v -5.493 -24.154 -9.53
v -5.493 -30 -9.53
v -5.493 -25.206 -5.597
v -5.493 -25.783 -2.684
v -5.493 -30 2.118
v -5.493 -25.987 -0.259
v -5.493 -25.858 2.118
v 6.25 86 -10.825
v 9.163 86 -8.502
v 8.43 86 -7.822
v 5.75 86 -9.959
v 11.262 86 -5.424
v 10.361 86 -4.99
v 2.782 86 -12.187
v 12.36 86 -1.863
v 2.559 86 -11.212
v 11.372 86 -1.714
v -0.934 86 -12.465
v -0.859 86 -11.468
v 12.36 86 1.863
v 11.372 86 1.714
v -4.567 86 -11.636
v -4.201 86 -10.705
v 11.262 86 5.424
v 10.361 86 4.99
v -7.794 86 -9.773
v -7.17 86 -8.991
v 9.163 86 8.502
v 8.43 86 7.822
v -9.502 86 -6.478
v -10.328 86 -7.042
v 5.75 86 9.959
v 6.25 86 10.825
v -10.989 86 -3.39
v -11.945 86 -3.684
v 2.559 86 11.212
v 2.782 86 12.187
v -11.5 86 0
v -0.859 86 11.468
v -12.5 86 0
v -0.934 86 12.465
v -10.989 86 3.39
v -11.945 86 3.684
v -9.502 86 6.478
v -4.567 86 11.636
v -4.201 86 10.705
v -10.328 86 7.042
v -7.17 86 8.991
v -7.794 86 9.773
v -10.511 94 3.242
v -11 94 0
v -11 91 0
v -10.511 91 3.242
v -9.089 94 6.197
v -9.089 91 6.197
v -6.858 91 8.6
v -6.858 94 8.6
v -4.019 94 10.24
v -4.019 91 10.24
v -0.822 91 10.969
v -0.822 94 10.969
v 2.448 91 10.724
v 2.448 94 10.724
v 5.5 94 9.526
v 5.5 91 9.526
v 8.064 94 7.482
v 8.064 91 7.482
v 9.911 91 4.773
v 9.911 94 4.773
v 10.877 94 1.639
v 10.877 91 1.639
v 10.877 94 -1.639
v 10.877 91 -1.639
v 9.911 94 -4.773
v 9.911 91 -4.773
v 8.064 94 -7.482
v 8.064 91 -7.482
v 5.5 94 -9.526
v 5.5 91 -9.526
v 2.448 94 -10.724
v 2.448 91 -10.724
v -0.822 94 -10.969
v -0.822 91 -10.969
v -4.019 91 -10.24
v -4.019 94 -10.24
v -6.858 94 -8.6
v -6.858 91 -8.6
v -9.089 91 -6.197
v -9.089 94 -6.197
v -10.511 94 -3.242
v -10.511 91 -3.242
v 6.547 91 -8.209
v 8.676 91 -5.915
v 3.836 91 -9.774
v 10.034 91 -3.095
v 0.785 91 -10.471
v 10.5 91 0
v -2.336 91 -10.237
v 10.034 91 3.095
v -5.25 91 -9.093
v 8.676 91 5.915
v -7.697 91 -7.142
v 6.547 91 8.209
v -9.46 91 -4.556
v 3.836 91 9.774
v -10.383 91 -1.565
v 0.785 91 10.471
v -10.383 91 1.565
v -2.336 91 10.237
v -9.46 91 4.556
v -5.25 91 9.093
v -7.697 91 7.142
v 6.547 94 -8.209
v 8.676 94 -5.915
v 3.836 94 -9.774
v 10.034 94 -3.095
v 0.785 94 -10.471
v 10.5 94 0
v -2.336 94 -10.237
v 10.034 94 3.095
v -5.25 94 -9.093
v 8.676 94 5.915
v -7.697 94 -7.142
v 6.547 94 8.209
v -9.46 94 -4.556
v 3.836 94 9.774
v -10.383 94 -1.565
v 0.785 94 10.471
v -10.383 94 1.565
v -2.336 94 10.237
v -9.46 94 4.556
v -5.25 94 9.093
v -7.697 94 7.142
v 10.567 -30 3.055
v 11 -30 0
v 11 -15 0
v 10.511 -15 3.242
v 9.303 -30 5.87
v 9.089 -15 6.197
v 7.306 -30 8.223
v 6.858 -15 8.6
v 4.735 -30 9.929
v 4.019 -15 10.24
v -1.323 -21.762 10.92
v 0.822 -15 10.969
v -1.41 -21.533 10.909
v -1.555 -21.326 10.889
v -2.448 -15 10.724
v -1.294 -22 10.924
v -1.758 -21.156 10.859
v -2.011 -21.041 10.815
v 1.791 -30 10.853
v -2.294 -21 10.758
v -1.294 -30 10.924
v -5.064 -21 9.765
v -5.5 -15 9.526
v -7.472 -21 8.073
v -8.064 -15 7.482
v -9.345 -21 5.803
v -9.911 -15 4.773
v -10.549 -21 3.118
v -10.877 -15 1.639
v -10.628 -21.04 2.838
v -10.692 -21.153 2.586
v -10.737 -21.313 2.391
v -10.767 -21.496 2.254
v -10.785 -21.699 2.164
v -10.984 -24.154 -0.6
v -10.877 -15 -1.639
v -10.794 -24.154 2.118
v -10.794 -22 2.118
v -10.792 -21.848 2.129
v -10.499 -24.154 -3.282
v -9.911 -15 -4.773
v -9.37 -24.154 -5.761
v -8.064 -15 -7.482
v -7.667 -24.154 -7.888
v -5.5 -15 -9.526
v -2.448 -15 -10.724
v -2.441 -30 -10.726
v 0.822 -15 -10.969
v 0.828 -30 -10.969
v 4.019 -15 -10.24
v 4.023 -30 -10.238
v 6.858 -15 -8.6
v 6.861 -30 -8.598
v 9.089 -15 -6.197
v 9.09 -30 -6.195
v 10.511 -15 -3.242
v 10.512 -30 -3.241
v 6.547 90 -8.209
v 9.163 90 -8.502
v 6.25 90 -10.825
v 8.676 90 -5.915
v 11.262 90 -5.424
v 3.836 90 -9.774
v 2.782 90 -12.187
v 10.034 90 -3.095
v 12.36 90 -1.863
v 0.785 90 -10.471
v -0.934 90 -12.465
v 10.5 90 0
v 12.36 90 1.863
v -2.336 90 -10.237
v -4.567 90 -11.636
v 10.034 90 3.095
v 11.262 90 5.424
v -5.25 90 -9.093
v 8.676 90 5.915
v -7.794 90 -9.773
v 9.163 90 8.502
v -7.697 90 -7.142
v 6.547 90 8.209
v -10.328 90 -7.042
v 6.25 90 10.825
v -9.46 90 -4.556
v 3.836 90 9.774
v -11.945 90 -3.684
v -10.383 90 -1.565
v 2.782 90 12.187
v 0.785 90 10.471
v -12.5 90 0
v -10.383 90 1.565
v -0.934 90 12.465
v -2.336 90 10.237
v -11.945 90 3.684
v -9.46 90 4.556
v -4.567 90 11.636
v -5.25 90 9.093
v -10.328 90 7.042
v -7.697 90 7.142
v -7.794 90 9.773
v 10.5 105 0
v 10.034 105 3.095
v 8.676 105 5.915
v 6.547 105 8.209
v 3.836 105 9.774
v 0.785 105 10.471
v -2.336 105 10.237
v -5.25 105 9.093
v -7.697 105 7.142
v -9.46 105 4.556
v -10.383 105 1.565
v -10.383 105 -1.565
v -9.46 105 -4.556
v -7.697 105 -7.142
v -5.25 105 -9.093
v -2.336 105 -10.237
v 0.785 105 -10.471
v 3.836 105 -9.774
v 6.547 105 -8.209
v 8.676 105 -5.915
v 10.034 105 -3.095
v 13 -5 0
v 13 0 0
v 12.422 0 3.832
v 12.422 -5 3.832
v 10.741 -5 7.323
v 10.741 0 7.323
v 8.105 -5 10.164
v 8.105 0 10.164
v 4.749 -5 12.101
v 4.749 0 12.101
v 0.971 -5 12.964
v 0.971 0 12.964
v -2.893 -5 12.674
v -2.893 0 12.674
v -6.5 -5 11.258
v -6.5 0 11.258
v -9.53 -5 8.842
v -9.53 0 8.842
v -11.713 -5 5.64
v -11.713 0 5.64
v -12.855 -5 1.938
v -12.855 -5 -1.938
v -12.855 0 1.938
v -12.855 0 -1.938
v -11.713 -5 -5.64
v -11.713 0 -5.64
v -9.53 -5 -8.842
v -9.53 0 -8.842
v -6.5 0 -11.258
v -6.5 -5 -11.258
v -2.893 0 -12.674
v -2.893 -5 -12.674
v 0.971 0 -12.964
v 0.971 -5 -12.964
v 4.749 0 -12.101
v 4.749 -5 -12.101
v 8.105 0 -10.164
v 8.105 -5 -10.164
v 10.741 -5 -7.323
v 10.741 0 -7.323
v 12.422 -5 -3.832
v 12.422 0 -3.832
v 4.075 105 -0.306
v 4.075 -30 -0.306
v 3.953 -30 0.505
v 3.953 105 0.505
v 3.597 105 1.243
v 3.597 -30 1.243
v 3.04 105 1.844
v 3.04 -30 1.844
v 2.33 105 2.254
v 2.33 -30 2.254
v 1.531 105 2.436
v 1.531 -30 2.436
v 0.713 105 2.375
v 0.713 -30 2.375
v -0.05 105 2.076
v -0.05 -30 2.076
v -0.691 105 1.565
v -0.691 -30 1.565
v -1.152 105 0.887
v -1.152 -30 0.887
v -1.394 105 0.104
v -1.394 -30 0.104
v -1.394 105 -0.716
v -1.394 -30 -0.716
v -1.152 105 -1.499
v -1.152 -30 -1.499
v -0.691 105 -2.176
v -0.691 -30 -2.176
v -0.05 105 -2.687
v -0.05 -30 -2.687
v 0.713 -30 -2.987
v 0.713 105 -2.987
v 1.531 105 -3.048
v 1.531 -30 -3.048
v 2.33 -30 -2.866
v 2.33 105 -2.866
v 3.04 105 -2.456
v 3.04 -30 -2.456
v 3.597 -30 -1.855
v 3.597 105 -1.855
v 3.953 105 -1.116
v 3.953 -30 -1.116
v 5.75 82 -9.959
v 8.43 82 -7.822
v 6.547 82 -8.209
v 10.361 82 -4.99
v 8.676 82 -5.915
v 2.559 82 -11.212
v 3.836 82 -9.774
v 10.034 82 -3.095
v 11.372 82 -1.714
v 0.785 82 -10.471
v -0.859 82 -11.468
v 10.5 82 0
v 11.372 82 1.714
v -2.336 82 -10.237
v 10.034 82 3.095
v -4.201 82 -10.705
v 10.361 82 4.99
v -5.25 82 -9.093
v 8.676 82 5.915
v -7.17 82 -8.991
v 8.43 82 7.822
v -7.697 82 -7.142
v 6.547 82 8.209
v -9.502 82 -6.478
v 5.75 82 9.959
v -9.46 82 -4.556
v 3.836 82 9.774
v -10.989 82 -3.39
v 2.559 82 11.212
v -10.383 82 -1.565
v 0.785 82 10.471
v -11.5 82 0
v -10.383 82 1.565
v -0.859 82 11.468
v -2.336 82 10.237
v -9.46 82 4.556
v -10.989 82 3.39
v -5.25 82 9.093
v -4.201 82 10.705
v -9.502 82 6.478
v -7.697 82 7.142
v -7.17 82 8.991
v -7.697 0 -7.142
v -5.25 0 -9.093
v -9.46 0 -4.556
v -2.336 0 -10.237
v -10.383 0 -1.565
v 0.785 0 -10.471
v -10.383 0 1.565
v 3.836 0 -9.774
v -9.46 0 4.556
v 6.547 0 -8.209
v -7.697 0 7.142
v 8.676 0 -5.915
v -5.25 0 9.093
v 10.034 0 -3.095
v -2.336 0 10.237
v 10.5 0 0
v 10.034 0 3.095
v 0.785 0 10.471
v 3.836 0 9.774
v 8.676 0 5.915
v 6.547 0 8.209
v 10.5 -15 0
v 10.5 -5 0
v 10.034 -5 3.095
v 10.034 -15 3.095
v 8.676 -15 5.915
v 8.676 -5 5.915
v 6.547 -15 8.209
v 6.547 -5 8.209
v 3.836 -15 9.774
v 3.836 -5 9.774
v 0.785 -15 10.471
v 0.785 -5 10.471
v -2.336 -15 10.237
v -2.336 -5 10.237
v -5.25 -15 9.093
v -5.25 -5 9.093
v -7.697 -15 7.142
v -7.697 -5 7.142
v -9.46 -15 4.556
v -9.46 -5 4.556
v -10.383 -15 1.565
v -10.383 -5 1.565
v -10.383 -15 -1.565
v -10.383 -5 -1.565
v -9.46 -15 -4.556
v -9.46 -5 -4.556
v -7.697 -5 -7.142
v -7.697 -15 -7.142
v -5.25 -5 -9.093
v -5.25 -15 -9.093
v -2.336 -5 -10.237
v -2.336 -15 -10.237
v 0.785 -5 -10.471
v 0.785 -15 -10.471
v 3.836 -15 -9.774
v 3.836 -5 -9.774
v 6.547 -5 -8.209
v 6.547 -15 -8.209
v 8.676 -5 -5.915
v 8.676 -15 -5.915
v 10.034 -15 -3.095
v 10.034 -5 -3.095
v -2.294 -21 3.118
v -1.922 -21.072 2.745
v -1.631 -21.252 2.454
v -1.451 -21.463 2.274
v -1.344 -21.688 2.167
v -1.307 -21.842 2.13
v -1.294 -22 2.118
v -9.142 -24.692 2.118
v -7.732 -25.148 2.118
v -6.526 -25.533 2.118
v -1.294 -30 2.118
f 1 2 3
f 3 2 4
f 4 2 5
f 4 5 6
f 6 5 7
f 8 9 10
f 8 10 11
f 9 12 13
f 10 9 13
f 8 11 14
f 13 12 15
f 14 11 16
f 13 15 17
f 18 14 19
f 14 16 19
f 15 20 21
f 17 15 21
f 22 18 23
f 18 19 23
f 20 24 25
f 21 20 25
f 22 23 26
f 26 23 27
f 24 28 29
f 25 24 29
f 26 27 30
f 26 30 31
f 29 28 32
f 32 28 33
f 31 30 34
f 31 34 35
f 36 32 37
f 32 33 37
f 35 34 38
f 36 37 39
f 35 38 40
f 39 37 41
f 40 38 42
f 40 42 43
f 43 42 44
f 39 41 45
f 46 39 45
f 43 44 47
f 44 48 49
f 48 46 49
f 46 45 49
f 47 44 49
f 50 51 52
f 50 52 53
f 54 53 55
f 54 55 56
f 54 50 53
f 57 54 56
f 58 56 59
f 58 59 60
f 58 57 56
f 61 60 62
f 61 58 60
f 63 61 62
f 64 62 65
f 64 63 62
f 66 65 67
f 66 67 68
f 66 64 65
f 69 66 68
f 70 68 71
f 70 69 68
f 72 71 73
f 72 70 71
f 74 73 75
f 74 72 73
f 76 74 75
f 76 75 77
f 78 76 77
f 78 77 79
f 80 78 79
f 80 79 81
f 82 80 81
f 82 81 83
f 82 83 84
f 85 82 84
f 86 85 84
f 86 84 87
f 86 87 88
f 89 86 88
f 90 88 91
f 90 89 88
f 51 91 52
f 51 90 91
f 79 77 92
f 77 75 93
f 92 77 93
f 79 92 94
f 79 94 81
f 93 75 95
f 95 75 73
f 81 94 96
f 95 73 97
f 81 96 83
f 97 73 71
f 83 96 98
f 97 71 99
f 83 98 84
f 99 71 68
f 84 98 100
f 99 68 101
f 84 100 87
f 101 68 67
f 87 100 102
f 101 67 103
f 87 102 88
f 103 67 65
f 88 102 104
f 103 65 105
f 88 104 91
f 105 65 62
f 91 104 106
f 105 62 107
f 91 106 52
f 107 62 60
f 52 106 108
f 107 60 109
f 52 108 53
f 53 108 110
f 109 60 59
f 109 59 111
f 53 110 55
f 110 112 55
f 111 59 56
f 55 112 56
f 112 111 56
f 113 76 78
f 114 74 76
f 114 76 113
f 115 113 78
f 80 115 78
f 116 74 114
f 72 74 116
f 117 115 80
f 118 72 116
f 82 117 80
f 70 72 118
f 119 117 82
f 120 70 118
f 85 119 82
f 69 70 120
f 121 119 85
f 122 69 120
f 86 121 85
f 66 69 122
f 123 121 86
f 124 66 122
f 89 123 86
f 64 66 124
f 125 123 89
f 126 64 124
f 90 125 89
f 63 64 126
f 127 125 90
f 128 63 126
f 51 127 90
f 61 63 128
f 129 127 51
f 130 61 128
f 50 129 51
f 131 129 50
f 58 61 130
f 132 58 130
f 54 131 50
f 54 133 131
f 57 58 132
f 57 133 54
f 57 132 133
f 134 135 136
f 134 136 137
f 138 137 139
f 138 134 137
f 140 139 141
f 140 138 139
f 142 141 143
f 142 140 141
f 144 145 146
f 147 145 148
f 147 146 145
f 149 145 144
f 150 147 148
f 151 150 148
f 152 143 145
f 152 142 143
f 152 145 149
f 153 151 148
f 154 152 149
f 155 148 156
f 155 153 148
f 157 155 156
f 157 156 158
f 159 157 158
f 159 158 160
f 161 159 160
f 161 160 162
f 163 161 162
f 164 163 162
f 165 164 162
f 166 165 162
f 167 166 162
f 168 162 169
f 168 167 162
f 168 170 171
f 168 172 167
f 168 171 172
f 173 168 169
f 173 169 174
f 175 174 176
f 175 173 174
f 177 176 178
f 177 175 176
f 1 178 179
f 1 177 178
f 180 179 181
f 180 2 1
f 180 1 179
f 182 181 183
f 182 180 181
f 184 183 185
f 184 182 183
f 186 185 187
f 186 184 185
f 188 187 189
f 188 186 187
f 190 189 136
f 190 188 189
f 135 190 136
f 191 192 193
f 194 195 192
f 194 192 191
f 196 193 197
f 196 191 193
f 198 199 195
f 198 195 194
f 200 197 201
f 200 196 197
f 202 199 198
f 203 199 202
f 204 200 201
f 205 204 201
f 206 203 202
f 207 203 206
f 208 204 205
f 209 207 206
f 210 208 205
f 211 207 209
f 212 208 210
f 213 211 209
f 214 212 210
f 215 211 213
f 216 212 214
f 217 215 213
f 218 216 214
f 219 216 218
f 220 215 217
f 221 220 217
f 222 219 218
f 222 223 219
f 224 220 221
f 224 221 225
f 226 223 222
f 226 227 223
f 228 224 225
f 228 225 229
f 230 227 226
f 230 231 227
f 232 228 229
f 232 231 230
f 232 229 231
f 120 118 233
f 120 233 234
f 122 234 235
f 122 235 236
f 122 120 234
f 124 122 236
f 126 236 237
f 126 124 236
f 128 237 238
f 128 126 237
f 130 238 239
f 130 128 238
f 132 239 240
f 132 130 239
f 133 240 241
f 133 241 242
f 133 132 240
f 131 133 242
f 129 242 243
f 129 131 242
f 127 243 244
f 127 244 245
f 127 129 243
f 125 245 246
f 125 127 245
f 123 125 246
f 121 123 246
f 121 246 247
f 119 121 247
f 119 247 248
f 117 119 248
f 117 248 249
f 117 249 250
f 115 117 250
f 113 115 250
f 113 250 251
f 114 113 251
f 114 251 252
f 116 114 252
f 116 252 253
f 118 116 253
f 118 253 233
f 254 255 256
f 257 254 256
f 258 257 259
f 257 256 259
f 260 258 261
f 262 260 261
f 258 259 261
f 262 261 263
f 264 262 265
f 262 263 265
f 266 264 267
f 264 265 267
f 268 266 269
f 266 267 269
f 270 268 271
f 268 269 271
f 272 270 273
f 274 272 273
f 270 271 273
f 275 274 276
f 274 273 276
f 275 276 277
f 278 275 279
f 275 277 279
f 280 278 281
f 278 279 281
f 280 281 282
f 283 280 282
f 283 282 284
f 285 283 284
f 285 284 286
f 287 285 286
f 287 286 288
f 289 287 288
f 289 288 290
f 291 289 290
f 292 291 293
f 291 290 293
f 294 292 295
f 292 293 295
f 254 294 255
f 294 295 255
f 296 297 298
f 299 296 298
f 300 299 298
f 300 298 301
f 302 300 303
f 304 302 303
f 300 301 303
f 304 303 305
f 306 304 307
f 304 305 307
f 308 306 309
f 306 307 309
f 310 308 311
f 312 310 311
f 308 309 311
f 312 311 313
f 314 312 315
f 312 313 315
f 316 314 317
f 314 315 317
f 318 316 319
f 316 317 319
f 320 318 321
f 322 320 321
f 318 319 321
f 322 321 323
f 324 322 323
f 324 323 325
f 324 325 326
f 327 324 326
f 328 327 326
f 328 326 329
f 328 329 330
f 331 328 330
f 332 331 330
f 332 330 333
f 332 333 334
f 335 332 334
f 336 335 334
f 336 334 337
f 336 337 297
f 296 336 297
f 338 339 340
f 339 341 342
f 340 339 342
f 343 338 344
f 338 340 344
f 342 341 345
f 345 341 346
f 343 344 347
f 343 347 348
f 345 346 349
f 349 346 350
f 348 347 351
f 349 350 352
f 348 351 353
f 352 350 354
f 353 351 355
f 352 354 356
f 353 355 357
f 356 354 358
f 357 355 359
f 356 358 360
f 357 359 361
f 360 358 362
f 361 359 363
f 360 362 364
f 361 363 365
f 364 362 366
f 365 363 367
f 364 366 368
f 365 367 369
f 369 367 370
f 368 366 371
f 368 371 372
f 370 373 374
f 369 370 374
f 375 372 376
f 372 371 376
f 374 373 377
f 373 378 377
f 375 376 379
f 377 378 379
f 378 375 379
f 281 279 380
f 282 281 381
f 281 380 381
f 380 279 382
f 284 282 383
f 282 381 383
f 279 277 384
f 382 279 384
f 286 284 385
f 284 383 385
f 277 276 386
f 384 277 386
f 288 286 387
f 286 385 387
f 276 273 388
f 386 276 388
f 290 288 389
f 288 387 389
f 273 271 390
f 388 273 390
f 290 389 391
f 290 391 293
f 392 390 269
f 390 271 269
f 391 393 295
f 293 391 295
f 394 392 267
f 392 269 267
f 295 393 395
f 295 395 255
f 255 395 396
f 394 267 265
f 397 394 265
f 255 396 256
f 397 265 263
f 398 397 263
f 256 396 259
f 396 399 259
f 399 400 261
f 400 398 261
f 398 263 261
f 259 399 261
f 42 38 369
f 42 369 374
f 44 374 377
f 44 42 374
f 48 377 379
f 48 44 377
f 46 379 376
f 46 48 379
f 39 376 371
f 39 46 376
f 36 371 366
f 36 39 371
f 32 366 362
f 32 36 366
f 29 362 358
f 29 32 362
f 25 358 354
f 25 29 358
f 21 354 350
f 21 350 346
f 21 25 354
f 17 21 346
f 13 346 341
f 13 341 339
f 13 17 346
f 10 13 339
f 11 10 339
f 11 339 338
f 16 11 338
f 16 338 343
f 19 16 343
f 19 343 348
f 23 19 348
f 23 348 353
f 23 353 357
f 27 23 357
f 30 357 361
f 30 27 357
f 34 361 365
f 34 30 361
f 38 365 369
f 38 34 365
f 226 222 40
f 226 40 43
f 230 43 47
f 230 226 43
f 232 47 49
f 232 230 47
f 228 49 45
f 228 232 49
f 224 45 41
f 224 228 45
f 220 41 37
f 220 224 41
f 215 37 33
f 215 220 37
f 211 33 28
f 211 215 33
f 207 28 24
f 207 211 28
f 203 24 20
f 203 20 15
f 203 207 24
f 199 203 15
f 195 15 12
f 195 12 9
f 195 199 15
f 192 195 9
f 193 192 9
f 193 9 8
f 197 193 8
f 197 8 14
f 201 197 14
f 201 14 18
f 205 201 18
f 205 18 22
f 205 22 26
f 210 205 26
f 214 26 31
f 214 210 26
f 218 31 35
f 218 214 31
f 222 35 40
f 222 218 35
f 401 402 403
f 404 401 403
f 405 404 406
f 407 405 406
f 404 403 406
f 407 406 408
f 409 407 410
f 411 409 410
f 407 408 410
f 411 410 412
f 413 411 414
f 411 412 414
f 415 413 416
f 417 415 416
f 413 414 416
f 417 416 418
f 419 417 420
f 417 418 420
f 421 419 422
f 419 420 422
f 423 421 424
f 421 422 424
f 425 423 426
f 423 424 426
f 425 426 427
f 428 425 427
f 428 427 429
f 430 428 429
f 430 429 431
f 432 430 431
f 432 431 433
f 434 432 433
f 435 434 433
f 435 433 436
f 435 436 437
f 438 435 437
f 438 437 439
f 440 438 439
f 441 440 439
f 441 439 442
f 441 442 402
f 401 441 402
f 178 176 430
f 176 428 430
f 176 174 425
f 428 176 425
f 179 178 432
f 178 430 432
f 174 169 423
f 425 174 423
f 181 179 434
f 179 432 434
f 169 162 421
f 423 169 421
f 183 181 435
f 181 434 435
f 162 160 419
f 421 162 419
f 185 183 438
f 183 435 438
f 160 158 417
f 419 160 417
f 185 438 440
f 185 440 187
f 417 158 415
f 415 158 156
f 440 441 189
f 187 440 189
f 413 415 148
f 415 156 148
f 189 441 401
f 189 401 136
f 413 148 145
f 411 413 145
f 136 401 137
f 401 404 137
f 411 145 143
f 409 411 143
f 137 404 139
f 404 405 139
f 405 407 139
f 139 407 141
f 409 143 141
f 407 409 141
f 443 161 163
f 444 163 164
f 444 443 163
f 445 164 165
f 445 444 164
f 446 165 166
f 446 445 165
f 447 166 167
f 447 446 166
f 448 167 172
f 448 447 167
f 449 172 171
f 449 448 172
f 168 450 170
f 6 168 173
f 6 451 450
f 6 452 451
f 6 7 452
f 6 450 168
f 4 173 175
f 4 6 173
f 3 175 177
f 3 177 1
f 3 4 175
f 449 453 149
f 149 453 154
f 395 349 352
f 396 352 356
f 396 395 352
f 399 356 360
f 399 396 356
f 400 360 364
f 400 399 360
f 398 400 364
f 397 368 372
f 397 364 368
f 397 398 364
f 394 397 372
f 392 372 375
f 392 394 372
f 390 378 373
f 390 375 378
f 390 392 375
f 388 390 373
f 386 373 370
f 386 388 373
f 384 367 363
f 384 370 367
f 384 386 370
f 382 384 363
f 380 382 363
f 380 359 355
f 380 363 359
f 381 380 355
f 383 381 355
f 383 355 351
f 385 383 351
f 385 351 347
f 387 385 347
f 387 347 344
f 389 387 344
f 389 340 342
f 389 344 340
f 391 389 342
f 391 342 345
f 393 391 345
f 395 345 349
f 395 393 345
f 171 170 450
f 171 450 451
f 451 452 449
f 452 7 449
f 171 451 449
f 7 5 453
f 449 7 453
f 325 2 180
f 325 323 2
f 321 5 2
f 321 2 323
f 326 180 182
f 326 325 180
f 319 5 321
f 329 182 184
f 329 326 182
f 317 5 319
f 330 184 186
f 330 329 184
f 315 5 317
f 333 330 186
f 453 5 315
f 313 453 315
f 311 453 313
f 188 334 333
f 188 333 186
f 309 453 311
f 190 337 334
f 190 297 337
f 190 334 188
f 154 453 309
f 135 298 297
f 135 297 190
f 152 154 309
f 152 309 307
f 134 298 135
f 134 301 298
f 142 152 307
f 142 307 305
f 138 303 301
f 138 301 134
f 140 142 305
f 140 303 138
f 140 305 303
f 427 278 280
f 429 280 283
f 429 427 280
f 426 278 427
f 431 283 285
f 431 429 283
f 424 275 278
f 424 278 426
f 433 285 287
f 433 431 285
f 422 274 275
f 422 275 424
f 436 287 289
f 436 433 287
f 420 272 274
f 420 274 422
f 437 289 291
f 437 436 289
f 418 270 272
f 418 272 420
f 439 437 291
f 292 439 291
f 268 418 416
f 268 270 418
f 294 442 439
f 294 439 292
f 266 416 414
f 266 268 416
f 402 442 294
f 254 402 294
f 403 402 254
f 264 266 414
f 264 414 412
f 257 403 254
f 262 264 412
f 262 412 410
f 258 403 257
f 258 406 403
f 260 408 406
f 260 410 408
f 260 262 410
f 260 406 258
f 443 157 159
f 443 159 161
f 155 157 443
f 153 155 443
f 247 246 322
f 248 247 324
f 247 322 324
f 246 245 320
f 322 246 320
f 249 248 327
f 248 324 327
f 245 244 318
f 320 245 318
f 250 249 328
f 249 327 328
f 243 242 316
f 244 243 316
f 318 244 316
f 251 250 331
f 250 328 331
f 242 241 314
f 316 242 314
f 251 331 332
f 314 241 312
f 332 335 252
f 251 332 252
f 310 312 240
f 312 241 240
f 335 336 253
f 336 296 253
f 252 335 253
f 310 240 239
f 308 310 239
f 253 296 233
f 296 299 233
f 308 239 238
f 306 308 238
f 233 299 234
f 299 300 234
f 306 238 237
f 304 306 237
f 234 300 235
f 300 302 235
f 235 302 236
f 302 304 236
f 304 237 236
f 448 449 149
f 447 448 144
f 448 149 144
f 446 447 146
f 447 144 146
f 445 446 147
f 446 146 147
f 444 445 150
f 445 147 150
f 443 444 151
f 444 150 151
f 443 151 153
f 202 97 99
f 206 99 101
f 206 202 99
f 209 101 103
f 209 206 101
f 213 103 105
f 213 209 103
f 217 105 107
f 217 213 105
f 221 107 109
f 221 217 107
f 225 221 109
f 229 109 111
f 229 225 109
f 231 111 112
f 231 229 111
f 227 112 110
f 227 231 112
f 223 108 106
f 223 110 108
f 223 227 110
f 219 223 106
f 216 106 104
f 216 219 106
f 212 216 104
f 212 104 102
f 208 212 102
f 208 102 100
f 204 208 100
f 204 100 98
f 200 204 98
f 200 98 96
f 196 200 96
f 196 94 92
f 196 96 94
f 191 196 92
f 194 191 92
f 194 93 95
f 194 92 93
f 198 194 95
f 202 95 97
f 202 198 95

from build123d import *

# Parameters (mm, degrees)
F0_R          = 13
F1_DEPTH      = 5
F2_R          = 10.5
F3_DEPTH      = 25
F3_DEPTH_BACK = 110
F6_START      = -19
F5_R          = 11.5
F5_R_2        = 10.5
F6_DEPTH      = 4
F7_R          = 11
F7_R_2        = 10.5
F8_DEPTH      = 15
F10_DEPTH     = 9
F11_R         = 1
F12_W         = 8.5742305964
F12_H         = 3.8462157547
F13_DEPTH     = 30
F14_T4_ANGLE  = 233.385278584
F16_START     = -15
F15_R         = 12.5
F15_R_2       = 10.5
F16_DEPTH     = 4
F18_START     = -11
F17_R         = 11
F17_R_2       = 10.5
F18_DEPTH     = 3
F19_R         = 2.75
F20_DEPTH     = 148


# Not quite as in the source:
# - a fillet or chamfer that OpenCascade refuses, or shapes differently, is made with other operations: its cross-section is extruded or revolved along the edge and cut away or added


with BuildPart() as f1:
    # F0 (on Front) → F1 (new body)
    with BuildSketch(Plane.XZ):
        Circle(F0_R)
    extrude(amount=F1_DEPTH)

    # F2 (on face) → F3 (join, two sides)
    with BuildSketch(Plane.XZ.offset(5)) as f3_sk:
        Circle(F2_R)
    extrude(amount=F3_DEPTH)
    extrude(f3_sk.sketch, amount=-F3_DEPTH_BACK)

    # F5 (on face) → F6 (join)
    with BuildSketch(Plane(origin=(0, 105, 0), x_dir=(-1, 0, 0), z_dir=(0, 1, 0)).offset(F6_START)):
        Circle(F5_R)
        Circle(F5_R_2, mode=Mode.SUBTRACT)
    extrude(amount=-F6_DEPTH)

    # F7 (on face) → F8 (join)
    with BuildSketch(Plane.XZ.offset(30)):
        Circle(F7_R)
        Circle(F7_R_2, mode=Mode.SUBTRACT)
    extrude(amount=-F8_DEPTH)

    # F9 (on face) → F10 (cut)
    with BuildSketch(Plane.XZ.offset(30)):
        with BuildLine():
            Line((-1.2941175373, 2.1176473238), (-1.2941175373, 10.9243700281))
            ThreePointArc((-1.2941175373, 10.9243700281), (-7.5067341919, 8.0813904617), (-10.8403367922, 2.1176473238))
            Line((-10.8403367922, 2.1176473238), (-1.2941175373, 2.1176473238))
        make_face()
    extrude(amount=-F10_DEPTH, mode=Mode.SUBTRACT)

    # F11
    f11_edges = [f1.edges().sort_by_distance(p)[0] for p in [
        (-6.044178, -21, 2.117647),
        (-1.294118, -21, 6.520629),
    ]]
    fillet(f11_edges, radius=F11_R)

    # F12 (on face) → F13 (cut)
    with BuildSketch(Plane.XY.offset(2.1176473238)):
        with Locations((-9.7801117226, -28.0768921226)):
            Rectangle(F12_W, F12_H)
    extrude(amount=-F13_DEPTH, mode=Mode.SUBTRACT)

    # F14: chamfer of 6 x 2 on 1 edges, made by hand


with BuildPart() as f14_tool2:
    # F14_s3 → F14_t4 (revolve)
    with BuildSketch(Plane(origin=(0, 0, 0), x_dir=(0, 1, 0), z_dir=(0.9992485549, 0, -0.0387598451))):
        Polygon((-24.1537842453, 11), (-26.1537842453, 5), (-26.1537842453, 11), align=None)
    revolve(axis=Axis((0, -26.1537842453, 0), (0, -1, 0)), revolution_arc=F14_T4_ANGLE)

    split(bisect_by=Plane.YZ.offset(-5.4929964244), keep=Keep.BOTTOM)


with BuildPart() as f1_1:
    add(f1.part)

    # F14_t1: cut F14_tool2
    add(f14_tool2.part, mode=Mode.SUBTRACT)

    # F15 (on face) → F16 (join)
    with BuildSketch(Plane(origin=(0, 105, 0), x_dir=(-1, 0, 0), z_dir=(0, 1, 0)).offset(F16_START)):
        Circle(F15_R)
        Circle(F15_R_2, mode=Mode.SUBTRACT)
    extrude(amount=-F16_DEPTH)

    # F17 (on face) → F18 (join)
    with BuildSketch(Plane(origin=(0, 105, 0), x_dir=(-1, 0, 0), z_dir=(0, 1, 0)).offset(F18_START)):
        Circle(F17_R)
        Circle(F17_R_2, mode=Mode.SUBTRACT)
    extrude(amount=-F18_DEPTH)

    # F19 (on face) → F20 (cut)
    with BuildSketch(Plane.XZ.offset(30)):
        with Locations((1.3252417254, -0.3058710963)):
            Circle(F19_R)
    extrude(amount=-F20_DEPTH, mode=Mode.SUBTRACT)


solid = f1_1.part
